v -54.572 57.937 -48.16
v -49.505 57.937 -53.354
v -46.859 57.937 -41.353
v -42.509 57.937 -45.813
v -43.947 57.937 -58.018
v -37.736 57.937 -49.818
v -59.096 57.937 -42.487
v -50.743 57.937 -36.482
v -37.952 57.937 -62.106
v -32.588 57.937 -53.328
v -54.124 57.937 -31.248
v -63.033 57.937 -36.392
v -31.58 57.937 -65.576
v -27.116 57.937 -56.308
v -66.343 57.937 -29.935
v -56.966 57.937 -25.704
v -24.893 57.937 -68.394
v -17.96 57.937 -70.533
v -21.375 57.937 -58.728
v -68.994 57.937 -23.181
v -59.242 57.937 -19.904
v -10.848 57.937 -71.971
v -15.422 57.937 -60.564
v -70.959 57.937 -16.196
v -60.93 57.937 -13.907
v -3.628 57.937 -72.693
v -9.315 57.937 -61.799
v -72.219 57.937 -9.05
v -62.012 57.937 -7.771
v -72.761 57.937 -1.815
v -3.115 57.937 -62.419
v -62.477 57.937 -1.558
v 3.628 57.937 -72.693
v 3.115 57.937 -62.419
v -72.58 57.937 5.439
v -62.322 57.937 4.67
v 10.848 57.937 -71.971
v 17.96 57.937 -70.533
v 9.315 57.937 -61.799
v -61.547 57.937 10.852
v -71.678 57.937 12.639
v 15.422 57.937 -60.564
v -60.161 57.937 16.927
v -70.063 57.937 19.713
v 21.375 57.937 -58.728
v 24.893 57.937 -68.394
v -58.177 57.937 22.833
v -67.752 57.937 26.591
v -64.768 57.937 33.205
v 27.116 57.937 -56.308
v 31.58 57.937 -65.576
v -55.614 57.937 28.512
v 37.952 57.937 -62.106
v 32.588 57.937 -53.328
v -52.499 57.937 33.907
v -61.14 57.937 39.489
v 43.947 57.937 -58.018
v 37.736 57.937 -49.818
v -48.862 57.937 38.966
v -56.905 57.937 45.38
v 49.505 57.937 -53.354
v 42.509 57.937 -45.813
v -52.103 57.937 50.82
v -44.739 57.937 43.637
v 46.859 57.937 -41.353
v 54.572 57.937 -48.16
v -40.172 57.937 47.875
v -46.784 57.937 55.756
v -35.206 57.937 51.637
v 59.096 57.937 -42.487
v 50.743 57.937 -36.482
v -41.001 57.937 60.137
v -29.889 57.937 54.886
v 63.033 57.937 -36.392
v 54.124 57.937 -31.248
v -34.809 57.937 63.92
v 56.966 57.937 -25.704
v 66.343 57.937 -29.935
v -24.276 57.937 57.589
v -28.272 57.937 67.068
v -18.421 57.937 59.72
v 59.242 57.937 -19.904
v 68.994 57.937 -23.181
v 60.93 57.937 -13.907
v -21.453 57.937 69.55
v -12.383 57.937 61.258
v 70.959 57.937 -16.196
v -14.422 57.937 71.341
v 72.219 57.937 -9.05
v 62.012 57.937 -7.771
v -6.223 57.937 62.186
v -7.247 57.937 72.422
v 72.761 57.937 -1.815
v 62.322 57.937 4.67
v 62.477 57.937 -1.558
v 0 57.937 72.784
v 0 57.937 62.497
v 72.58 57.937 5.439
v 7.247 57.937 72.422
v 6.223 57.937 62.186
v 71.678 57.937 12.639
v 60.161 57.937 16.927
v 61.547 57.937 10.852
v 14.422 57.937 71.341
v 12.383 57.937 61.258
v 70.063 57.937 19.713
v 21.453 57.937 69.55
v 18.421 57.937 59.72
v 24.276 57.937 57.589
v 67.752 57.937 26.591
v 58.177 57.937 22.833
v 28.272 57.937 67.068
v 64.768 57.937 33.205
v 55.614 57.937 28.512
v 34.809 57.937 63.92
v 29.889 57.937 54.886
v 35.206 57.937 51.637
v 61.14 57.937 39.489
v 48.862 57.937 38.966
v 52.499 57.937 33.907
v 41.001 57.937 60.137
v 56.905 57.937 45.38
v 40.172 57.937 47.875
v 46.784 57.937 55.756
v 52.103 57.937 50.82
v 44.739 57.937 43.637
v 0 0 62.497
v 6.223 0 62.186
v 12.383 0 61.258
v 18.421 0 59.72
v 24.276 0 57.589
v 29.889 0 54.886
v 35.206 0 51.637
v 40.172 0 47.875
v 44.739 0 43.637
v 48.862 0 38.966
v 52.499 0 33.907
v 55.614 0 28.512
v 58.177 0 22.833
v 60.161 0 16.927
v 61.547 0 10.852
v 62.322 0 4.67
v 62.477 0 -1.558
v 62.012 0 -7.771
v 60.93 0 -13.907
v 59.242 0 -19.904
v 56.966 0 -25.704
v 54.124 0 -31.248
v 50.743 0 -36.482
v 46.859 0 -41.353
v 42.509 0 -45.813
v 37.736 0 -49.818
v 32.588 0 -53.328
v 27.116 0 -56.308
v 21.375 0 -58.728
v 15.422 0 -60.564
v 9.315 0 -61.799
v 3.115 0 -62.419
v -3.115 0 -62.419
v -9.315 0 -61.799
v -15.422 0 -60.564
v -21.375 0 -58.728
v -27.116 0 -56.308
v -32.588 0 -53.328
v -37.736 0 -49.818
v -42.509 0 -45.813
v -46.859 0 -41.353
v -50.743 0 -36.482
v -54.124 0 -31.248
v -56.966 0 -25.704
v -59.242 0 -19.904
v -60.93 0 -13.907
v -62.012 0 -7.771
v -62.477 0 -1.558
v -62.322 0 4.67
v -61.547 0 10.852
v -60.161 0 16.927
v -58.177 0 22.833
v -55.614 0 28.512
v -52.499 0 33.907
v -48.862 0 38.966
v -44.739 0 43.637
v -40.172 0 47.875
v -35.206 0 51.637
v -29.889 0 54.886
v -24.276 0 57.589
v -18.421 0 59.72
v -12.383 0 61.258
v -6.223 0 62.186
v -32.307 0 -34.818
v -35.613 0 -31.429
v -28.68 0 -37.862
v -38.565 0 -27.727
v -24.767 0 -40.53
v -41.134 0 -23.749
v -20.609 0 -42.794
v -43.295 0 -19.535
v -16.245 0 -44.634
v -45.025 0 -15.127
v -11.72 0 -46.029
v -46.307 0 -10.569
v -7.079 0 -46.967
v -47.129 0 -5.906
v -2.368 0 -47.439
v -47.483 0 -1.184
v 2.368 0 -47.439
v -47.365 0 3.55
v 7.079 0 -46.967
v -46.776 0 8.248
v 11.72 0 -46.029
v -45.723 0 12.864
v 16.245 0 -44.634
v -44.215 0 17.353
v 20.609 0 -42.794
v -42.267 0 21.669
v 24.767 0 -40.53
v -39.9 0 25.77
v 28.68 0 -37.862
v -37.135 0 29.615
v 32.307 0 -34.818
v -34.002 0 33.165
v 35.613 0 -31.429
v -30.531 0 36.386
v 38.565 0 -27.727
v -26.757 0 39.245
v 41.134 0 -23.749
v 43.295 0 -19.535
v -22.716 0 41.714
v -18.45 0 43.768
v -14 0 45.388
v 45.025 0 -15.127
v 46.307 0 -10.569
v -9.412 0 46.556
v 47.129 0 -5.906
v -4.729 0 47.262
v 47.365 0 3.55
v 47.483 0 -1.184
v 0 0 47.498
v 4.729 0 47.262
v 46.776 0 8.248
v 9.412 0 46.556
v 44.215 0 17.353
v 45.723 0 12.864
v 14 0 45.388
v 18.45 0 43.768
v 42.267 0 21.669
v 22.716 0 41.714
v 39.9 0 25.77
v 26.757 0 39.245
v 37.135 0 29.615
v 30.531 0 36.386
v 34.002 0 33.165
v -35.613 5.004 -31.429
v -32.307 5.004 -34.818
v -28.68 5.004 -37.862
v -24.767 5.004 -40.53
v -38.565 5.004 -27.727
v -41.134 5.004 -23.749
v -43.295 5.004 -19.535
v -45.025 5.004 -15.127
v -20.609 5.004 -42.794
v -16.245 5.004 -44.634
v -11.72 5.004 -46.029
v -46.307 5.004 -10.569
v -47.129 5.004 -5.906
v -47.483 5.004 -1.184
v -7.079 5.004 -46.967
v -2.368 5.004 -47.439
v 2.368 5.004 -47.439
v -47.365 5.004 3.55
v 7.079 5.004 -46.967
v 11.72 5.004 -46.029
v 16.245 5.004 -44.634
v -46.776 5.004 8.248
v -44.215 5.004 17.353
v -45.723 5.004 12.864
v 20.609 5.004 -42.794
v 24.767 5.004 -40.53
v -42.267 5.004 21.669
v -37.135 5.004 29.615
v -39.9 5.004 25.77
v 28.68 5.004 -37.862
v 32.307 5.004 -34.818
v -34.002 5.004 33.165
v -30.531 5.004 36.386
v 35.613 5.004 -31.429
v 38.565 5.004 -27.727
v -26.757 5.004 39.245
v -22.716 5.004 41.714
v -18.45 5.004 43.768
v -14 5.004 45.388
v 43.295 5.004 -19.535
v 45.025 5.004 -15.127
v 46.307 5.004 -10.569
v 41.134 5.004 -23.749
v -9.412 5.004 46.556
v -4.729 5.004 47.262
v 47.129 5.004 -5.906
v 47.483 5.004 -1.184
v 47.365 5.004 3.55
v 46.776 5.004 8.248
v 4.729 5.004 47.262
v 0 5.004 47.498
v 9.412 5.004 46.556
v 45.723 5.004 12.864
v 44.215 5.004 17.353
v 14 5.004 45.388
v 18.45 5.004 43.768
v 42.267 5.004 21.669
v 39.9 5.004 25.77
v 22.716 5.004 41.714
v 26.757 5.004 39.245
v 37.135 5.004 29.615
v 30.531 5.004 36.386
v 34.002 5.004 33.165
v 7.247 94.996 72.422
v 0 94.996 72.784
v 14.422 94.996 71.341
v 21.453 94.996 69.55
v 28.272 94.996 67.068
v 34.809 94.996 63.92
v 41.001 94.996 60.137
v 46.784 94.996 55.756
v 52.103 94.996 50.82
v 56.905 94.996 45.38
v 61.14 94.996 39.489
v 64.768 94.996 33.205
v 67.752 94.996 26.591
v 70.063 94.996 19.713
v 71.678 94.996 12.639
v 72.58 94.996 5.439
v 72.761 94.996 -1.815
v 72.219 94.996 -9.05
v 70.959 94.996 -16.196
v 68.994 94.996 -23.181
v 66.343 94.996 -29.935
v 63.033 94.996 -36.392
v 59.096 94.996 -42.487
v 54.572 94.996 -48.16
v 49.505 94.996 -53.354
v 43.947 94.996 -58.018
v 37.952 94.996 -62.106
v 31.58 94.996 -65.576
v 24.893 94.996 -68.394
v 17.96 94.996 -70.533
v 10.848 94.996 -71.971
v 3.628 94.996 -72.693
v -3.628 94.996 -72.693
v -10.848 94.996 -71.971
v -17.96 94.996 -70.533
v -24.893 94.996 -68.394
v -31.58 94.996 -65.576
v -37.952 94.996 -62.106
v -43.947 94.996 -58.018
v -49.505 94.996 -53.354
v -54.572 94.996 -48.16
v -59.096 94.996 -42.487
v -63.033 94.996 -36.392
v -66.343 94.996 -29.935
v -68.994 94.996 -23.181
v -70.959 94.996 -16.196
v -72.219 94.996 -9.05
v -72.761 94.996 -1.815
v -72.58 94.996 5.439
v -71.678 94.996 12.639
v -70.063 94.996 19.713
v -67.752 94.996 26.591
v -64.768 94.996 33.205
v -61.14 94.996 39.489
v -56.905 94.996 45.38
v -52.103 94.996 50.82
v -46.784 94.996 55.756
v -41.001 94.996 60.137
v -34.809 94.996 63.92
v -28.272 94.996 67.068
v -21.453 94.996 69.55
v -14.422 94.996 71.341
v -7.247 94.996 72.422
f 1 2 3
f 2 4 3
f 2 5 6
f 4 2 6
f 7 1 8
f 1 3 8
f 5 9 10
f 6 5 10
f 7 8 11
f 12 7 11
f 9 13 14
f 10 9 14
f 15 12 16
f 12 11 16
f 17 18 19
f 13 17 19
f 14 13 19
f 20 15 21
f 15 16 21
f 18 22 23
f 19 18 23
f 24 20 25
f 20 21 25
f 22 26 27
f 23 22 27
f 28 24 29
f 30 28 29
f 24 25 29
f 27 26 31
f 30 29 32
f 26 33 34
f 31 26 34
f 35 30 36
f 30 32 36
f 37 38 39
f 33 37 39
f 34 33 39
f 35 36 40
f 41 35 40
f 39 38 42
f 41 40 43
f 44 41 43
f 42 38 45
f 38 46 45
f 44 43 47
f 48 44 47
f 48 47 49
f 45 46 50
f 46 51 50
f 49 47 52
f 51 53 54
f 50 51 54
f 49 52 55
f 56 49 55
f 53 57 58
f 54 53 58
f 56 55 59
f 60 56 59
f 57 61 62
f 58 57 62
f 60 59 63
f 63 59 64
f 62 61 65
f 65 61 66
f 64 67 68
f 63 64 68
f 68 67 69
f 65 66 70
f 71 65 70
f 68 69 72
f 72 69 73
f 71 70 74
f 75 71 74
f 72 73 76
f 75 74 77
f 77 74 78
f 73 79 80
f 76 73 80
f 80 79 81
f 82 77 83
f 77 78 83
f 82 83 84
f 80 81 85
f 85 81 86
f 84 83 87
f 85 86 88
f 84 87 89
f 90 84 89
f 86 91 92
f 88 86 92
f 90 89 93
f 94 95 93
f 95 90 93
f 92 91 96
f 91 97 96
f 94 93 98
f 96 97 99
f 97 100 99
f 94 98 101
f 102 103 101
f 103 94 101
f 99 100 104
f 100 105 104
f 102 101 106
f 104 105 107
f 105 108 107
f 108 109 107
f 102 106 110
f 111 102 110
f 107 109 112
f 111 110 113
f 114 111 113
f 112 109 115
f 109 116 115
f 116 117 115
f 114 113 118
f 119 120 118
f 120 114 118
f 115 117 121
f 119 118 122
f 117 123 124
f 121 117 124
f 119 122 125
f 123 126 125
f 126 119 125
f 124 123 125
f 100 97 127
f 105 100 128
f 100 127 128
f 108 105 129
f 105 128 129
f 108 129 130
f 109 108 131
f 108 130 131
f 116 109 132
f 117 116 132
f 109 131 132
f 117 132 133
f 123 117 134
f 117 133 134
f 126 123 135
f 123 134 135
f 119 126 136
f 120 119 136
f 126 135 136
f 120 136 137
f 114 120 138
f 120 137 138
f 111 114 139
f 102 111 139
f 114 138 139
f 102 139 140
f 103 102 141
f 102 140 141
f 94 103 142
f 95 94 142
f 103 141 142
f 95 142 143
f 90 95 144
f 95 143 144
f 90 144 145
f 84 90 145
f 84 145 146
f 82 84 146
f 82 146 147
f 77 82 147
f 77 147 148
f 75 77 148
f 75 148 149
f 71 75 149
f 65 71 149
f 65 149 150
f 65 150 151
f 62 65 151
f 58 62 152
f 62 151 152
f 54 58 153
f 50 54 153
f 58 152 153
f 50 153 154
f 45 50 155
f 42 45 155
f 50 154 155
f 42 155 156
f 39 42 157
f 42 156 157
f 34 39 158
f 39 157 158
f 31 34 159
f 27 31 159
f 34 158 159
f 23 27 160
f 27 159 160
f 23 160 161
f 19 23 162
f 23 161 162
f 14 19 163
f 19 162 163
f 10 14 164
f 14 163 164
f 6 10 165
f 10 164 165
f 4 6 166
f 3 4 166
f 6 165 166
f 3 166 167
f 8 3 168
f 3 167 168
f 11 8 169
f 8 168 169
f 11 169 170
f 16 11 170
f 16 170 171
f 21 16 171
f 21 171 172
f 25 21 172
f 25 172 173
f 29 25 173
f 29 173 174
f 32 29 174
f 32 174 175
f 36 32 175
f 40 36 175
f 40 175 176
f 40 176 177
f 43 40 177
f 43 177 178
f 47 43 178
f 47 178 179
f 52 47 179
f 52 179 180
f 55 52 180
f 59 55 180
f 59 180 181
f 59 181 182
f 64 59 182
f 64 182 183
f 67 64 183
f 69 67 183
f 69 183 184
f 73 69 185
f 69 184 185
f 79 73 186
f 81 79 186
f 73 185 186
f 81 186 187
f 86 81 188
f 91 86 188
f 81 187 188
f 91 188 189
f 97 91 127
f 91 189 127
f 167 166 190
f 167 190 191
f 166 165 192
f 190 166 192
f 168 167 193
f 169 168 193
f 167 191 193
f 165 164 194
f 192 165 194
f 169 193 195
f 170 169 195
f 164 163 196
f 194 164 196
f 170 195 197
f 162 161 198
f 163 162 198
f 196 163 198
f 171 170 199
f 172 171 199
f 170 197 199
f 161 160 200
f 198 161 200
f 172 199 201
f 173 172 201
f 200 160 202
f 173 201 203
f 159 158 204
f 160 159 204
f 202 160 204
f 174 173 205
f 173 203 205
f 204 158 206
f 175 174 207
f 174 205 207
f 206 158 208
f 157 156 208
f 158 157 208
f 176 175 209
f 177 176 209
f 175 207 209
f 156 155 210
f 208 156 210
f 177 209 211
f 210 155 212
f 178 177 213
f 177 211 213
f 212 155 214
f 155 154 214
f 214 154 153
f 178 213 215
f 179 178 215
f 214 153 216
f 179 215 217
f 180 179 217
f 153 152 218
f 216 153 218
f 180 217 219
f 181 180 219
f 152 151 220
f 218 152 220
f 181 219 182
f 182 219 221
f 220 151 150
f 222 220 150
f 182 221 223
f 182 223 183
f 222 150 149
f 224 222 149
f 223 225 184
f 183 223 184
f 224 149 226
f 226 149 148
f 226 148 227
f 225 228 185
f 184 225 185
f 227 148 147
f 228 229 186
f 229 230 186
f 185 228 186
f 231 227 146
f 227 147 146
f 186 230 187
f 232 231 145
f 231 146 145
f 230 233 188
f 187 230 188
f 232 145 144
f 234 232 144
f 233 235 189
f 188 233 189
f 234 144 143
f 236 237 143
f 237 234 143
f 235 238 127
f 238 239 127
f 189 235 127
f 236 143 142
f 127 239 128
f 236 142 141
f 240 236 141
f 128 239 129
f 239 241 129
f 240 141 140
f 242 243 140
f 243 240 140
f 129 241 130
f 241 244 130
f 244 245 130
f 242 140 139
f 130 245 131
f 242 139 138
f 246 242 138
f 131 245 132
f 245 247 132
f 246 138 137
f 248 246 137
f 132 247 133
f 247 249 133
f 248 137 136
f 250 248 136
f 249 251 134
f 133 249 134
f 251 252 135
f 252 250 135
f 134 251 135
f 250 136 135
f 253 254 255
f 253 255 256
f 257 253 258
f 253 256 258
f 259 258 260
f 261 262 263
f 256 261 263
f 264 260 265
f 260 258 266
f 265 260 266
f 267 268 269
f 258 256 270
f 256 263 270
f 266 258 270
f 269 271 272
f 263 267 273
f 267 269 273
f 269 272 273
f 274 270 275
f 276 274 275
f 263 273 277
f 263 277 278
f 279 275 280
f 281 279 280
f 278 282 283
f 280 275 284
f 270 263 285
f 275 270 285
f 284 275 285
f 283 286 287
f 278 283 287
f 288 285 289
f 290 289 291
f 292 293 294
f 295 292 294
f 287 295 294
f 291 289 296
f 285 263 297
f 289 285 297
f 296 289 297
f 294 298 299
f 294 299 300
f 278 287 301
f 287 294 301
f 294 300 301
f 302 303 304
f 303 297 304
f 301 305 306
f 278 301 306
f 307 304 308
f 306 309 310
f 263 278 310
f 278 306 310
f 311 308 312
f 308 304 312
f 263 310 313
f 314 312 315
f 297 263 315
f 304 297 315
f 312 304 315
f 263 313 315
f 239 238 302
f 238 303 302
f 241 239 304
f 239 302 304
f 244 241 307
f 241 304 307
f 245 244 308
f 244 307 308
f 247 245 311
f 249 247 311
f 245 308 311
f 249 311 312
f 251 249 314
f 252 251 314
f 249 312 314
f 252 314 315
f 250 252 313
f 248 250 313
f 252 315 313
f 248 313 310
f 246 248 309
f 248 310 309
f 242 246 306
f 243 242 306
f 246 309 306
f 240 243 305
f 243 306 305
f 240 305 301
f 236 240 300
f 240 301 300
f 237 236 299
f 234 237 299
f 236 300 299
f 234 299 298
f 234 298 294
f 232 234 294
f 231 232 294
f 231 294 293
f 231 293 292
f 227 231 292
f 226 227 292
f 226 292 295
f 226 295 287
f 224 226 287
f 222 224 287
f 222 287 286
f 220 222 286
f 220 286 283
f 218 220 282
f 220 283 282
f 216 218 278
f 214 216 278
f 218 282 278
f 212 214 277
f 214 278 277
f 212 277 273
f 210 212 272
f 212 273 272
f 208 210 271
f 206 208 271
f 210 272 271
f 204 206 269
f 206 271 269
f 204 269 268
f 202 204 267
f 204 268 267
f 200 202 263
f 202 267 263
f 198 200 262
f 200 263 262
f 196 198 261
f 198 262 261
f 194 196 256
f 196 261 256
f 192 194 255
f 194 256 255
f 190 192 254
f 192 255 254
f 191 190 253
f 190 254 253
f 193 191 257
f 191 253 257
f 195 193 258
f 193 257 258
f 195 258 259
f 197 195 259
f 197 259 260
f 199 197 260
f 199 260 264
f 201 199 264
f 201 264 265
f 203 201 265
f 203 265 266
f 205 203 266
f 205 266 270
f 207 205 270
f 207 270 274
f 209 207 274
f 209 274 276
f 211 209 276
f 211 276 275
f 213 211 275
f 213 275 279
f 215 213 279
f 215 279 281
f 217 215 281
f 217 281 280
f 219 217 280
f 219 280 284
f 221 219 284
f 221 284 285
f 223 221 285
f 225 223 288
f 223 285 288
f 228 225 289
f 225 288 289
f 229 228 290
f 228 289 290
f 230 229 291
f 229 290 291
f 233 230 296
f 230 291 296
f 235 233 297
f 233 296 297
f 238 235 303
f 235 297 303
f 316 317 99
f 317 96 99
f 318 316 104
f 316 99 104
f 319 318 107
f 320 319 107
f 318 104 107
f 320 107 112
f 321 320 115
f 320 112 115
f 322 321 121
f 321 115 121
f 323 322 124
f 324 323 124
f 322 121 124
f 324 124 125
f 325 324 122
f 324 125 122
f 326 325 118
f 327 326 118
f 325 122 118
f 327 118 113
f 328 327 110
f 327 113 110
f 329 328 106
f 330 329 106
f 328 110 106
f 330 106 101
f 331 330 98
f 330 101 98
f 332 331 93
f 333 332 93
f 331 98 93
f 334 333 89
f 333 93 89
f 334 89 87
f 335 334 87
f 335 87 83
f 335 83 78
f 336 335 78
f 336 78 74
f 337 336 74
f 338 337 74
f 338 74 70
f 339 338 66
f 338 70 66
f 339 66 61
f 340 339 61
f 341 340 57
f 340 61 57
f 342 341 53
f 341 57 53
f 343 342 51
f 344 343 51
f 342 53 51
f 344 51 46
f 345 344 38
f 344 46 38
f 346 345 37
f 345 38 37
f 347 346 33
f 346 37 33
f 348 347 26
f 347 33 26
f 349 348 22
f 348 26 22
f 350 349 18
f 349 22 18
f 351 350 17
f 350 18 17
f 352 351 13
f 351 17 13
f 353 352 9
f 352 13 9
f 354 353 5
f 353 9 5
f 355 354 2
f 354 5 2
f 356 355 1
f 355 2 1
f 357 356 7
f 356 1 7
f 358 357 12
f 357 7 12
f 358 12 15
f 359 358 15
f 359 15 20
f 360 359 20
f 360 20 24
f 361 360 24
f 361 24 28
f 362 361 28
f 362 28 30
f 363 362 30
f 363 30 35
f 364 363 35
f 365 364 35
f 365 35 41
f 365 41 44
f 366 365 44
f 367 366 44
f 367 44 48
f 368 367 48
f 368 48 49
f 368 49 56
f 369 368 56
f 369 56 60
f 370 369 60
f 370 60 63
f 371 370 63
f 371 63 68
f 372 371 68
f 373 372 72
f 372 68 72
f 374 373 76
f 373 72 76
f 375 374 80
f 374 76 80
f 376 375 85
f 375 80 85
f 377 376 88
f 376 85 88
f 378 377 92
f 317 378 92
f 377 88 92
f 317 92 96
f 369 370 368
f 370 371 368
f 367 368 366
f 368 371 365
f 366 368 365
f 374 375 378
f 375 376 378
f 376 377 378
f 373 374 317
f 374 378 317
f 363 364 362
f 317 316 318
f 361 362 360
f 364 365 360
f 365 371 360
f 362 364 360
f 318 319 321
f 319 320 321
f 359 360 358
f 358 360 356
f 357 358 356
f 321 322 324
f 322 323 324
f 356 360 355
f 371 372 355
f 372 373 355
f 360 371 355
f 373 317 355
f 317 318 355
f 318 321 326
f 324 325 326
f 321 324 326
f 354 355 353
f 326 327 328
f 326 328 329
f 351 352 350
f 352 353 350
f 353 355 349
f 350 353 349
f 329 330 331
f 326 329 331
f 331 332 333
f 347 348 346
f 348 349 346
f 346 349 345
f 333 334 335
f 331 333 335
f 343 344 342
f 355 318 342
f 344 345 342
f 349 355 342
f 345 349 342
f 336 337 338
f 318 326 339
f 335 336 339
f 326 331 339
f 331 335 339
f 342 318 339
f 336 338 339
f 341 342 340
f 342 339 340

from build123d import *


with BuildPart() as f2:
    # F0 (on Right) → F2 (revolve)
    with BuildSketch(Plane.YZ):
        Polygon((5.0038, 47.498), (5.0038, 0), (57.9374, 0), (57.9374, 62.4967), (0, 62.4967), (0, 47.498), align=None)
        Polygon((57.9374, 62.4967), (57.9374, 0), (94.996, 0), (94.996, 72.7837), (57.9374, 72.7837), align=None)
    revolve(axis=Axis((0, 35.516532, 0), (0, 1, 0)))


solid = f2.part
